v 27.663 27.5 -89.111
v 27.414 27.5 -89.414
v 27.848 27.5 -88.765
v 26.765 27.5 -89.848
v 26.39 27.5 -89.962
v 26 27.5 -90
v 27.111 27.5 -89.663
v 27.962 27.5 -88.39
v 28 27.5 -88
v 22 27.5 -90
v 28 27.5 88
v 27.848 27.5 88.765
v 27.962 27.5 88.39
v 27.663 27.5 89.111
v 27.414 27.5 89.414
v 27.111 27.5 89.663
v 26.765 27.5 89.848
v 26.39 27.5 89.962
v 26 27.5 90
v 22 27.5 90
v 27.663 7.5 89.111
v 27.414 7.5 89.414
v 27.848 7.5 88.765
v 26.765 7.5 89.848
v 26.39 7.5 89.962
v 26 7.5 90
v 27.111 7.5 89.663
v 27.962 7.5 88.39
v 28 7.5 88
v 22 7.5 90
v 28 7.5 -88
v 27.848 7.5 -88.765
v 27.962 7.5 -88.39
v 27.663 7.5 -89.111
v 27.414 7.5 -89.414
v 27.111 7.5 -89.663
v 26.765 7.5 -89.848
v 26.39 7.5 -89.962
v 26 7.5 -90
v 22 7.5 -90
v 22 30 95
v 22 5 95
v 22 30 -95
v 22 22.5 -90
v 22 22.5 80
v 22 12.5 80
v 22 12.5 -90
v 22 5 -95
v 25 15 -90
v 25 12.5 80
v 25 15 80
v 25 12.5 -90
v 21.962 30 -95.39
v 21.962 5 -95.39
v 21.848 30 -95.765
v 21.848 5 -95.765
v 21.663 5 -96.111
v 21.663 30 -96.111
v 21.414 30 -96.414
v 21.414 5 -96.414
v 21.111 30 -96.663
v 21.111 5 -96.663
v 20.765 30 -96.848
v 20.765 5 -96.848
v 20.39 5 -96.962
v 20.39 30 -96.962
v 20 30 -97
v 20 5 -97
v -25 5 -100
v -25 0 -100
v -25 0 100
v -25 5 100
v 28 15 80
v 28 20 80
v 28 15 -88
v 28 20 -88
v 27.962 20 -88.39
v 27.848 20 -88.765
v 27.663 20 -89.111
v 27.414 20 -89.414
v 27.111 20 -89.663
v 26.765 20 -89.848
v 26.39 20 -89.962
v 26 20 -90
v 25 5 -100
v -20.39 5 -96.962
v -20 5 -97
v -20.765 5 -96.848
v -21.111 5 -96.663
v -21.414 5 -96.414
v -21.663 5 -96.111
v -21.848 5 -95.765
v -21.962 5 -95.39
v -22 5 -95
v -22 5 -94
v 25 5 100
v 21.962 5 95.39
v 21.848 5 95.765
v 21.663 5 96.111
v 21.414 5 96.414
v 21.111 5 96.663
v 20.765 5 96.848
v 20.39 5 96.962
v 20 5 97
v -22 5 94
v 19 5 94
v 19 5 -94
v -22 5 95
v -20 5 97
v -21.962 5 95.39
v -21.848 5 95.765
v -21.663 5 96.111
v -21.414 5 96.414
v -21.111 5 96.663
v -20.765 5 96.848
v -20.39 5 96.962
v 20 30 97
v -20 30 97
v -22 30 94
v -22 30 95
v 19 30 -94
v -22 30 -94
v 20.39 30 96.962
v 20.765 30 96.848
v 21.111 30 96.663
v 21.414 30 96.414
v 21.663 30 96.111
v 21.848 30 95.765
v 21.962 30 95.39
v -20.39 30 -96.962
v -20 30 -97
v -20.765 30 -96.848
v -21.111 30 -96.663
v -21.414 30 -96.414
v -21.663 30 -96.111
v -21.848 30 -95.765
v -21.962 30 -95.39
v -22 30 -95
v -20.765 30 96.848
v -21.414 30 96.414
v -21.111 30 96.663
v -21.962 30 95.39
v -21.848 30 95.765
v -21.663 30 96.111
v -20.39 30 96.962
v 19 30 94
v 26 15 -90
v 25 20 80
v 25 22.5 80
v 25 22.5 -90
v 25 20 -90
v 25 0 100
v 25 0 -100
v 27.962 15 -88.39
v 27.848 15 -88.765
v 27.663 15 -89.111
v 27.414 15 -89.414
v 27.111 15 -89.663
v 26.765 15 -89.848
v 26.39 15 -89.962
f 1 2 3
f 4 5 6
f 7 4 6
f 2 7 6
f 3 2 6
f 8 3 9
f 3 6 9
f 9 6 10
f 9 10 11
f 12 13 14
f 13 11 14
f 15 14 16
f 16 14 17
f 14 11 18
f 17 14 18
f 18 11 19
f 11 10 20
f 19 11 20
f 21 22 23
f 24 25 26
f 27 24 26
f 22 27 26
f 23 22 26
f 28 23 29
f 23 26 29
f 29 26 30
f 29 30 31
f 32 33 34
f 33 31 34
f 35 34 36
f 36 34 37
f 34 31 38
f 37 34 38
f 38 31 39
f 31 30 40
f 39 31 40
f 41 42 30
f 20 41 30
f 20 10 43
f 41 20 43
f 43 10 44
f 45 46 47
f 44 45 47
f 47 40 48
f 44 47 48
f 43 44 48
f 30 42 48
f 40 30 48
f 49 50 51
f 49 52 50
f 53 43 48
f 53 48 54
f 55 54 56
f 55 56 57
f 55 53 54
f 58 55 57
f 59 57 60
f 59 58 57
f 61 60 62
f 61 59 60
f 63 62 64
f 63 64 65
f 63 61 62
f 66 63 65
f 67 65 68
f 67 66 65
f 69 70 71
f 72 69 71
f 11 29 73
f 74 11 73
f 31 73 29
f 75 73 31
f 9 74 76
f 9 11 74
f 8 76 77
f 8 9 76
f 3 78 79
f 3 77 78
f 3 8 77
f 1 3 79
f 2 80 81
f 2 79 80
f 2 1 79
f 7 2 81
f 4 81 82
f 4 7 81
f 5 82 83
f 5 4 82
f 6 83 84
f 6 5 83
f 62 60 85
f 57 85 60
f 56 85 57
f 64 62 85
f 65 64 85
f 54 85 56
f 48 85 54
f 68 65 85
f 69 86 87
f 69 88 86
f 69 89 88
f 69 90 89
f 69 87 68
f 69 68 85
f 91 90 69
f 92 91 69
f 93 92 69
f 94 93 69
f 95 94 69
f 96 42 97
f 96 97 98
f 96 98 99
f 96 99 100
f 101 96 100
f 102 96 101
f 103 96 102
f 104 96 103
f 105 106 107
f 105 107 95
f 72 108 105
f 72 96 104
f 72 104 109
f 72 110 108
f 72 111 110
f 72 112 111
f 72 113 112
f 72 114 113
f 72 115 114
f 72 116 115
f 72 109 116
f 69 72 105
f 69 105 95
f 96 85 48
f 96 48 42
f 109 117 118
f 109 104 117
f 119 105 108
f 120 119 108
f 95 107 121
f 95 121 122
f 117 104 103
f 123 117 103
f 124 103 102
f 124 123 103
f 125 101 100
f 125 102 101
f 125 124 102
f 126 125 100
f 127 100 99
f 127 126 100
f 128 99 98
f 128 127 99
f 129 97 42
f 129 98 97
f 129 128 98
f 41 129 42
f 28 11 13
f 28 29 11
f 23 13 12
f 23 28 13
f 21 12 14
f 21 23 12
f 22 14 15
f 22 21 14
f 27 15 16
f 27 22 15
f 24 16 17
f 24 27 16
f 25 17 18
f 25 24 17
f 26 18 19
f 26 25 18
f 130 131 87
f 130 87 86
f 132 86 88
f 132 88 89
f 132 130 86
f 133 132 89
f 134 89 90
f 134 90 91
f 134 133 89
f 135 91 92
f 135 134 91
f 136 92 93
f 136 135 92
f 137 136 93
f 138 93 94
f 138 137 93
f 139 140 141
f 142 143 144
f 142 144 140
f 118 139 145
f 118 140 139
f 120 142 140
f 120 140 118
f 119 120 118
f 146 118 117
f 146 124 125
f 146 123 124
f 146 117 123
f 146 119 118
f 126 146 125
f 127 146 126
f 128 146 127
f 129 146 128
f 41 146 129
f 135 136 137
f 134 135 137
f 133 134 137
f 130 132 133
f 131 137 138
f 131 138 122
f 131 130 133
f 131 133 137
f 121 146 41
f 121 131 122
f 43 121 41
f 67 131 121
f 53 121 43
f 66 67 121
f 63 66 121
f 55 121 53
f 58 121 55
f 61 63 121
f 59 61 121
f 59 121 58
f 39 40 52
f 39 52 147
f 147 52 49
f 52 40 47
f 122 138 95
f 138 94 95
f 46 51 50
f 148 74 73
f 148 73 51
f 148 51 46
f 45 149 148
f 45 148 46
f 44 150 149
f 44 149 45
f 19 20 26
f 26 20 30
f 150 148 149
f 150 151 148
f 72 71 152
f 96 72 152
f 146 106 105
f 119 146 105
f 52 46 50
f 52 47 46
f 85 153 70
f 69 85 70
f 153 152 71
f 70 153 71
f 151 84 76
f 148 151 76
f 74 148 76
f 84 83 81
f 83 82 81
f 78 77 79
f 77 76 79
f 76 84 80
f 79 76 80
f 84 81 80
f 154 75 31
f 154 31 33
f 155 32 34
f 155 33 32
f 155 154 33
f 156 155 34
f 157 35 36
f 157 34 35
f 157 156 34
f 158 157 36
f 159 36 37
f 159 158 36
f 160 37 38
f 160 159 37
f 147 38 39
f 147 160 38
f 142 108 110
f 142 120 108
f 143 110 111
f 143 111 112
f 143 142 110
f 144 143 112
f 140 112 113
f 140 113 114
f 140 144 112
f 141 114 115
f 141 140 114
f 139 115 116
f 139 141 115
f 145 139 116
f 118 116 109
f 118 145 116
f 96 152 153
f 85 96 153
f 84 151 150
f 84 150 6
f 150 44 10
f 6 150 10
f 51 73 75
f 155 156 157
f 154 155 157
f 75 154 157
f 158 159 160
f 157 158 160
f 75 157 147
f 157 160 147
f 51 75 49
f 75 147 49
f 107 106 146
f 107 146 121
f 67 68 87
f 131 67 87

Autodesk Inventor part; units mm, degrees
ref_plane "YZ Plane" through (0, 0, 0) normal (1, 0, 0) x (0, 1, 0)
ref_plane "XZ Plane" through (0, 0, 0) normal (0, 1, 0) x (-1, 0, 0)
ref_plane "XY Plane" through (0, 0, 0) normal (0, 0, 1) x (1, 0, 0)
sketch "Sketch1" plane through (0, 0, 0) normal (0, 1, 0) x (-1, 0, 0)
  line L0 (-25, -100) -> (25, -100)
  line L1 (25, -100) -> (25, 100)
  line L2 (25, 100) -> (-25, 100)
  line L3 (-25, 100) -> (-25, -100)
  line L4 (-25, -100) -> (25, 100) construction
  line L5 (25, -100) -> (-25, 100) construction
  point P0 (0, 0)
  dimension "d0" = 50
  dimension "d1" = 200
extrude "Extrusion1" add sketch "Sketch1" along normal blind 5
sketch "Sketch2" plane through (0, 5, 0) normal (0, 1, 0) x (1, 0, 0)
  line L0 (22, 97) -> (-22, 97)
  line L1 (22, -97) -> (22, 97)
  line L2 (-25, -100) -> (25, -100) projected
  line L3 (25, -100) -> (25, 100) projected
  line L4 (19, 94) -> (-22, 94)
  line L5 (19, -94) -> (19, 94)
  line L6 (25, 100) -> (-25, 100) projected
  line L7 (-22, 97) -> (-22, 94)
  line L8 (-25, 100) -> (-25, -100) projected
  line L9 (22, -97) -> (-22, -97)
  line L10 (22, -97) -> (66, -97) construction
  line L11 (19, -94) -> (-22, -94)
  line L12 (19, -94) -> (60, -94) construction
  line L13 (-22, -94) -> (-22, -97)
  point P0 (0, 0)
  dimension "d5" = 3
  dimension "d6" = 3
  dimension "d10" = 3
  dimension "d11" = 3
  dimension "d12" = 3
  dimension "d33" = 3
  dimension "d34" = 3
  dimension "d35" = 3
extrude "Extrusion2" add sketch "Sketch2" along normal blind 25 contours L1 L9 L13 L11 L5 L4 L7 L0
fillet "Fillet1" radius 2 4 edges at (22, 17.5, 97) (22, 17.5, -97) (-22, 17.5, -97) (-22, 17.5, 97)
sketch "Sketch3" plane through (22, 5, 95) normal (1, 0, 0) x (0, 0, -1)
  line L0 (185, 22.5) -> (5, 22.5)
  line L1 (5, 22.5) -> (5, 2.5)
  line L2 (5, 2.5) -> (185, 2.5)
  line L3 (185, 2.5) -> (185, 22.5)
  line L4 (185, 22.5) -> (5, 2.5) construction
  line L5 (5, 22.5) -> (185, 2.5) construction
  line L6 (-5, -5) -> (-5, 0) projected
  line L7 (195, -5) -> (195, 0) projected
  line L8 (0, 0) -> (0, 25) projected
  point P0 (95, -5)
  point P1 (95, 12.5)
  point P2 (0, 12.5)
  dimension "d15" = 10
  dimension "d16" = 10
  dimension "d17" = 20
  dimension "d18" = 10
extrude "Extrusion3" add sketch "Sketch3" along normal blind 6
sketch "Sketch4" plane through (22, 7.5, -90) normal (0, 0, -1) x (-1, 0, 0)
  line L0 (0, 20) -> (0, 0) projected
  line L1 (0, 20) -> (-6, 20) projected
  line L2 (-6, 0) -> (-6, 20) projected
  line L3 (0, 0) -> (-6, 0) projected
  line L4 (-6, 7.5) -> (-3, 7.5)
  line L5 (-3, 7.5) -> (-3, 12.5)
  line L6 (-3, 12.5) -> (-6, 12.5)
  line L7 (-6, 12.5) -> (-6, 7.5)
  line L8 (0, 5) -> (-3, 5)
  line L9 (-3, 5) -> (-3, 15)
  line L10 (-3, 15) -> (0, 15)
  line L11 (0, 15) -> (0, 5)
  point P0 (22, -7.5)
  point P1 (0, 15)
  point P2 (-3, 12.5)
  point P3 (-6, 12.5)
  point P4 (-3, 7.5)
  dimension "d22" = 3
  dimension "d23" = 3
  dimension "d24" = 2.5
  dimension "d25" = 2.5
  dimension "d26" = 5
  dimension "d27" = 5
extrude "Extrusion4" cut sketch "Sketch4" against normal blind 170 contours L0 L8 L9 L5 L10 | L6 L5 L4 L2
fillet "Fillet2" radius 2 3 edges at (28, 17.5, 90) (28, 23.75, -90) (28, 11.25, -90)
properties part number "module_valve"
